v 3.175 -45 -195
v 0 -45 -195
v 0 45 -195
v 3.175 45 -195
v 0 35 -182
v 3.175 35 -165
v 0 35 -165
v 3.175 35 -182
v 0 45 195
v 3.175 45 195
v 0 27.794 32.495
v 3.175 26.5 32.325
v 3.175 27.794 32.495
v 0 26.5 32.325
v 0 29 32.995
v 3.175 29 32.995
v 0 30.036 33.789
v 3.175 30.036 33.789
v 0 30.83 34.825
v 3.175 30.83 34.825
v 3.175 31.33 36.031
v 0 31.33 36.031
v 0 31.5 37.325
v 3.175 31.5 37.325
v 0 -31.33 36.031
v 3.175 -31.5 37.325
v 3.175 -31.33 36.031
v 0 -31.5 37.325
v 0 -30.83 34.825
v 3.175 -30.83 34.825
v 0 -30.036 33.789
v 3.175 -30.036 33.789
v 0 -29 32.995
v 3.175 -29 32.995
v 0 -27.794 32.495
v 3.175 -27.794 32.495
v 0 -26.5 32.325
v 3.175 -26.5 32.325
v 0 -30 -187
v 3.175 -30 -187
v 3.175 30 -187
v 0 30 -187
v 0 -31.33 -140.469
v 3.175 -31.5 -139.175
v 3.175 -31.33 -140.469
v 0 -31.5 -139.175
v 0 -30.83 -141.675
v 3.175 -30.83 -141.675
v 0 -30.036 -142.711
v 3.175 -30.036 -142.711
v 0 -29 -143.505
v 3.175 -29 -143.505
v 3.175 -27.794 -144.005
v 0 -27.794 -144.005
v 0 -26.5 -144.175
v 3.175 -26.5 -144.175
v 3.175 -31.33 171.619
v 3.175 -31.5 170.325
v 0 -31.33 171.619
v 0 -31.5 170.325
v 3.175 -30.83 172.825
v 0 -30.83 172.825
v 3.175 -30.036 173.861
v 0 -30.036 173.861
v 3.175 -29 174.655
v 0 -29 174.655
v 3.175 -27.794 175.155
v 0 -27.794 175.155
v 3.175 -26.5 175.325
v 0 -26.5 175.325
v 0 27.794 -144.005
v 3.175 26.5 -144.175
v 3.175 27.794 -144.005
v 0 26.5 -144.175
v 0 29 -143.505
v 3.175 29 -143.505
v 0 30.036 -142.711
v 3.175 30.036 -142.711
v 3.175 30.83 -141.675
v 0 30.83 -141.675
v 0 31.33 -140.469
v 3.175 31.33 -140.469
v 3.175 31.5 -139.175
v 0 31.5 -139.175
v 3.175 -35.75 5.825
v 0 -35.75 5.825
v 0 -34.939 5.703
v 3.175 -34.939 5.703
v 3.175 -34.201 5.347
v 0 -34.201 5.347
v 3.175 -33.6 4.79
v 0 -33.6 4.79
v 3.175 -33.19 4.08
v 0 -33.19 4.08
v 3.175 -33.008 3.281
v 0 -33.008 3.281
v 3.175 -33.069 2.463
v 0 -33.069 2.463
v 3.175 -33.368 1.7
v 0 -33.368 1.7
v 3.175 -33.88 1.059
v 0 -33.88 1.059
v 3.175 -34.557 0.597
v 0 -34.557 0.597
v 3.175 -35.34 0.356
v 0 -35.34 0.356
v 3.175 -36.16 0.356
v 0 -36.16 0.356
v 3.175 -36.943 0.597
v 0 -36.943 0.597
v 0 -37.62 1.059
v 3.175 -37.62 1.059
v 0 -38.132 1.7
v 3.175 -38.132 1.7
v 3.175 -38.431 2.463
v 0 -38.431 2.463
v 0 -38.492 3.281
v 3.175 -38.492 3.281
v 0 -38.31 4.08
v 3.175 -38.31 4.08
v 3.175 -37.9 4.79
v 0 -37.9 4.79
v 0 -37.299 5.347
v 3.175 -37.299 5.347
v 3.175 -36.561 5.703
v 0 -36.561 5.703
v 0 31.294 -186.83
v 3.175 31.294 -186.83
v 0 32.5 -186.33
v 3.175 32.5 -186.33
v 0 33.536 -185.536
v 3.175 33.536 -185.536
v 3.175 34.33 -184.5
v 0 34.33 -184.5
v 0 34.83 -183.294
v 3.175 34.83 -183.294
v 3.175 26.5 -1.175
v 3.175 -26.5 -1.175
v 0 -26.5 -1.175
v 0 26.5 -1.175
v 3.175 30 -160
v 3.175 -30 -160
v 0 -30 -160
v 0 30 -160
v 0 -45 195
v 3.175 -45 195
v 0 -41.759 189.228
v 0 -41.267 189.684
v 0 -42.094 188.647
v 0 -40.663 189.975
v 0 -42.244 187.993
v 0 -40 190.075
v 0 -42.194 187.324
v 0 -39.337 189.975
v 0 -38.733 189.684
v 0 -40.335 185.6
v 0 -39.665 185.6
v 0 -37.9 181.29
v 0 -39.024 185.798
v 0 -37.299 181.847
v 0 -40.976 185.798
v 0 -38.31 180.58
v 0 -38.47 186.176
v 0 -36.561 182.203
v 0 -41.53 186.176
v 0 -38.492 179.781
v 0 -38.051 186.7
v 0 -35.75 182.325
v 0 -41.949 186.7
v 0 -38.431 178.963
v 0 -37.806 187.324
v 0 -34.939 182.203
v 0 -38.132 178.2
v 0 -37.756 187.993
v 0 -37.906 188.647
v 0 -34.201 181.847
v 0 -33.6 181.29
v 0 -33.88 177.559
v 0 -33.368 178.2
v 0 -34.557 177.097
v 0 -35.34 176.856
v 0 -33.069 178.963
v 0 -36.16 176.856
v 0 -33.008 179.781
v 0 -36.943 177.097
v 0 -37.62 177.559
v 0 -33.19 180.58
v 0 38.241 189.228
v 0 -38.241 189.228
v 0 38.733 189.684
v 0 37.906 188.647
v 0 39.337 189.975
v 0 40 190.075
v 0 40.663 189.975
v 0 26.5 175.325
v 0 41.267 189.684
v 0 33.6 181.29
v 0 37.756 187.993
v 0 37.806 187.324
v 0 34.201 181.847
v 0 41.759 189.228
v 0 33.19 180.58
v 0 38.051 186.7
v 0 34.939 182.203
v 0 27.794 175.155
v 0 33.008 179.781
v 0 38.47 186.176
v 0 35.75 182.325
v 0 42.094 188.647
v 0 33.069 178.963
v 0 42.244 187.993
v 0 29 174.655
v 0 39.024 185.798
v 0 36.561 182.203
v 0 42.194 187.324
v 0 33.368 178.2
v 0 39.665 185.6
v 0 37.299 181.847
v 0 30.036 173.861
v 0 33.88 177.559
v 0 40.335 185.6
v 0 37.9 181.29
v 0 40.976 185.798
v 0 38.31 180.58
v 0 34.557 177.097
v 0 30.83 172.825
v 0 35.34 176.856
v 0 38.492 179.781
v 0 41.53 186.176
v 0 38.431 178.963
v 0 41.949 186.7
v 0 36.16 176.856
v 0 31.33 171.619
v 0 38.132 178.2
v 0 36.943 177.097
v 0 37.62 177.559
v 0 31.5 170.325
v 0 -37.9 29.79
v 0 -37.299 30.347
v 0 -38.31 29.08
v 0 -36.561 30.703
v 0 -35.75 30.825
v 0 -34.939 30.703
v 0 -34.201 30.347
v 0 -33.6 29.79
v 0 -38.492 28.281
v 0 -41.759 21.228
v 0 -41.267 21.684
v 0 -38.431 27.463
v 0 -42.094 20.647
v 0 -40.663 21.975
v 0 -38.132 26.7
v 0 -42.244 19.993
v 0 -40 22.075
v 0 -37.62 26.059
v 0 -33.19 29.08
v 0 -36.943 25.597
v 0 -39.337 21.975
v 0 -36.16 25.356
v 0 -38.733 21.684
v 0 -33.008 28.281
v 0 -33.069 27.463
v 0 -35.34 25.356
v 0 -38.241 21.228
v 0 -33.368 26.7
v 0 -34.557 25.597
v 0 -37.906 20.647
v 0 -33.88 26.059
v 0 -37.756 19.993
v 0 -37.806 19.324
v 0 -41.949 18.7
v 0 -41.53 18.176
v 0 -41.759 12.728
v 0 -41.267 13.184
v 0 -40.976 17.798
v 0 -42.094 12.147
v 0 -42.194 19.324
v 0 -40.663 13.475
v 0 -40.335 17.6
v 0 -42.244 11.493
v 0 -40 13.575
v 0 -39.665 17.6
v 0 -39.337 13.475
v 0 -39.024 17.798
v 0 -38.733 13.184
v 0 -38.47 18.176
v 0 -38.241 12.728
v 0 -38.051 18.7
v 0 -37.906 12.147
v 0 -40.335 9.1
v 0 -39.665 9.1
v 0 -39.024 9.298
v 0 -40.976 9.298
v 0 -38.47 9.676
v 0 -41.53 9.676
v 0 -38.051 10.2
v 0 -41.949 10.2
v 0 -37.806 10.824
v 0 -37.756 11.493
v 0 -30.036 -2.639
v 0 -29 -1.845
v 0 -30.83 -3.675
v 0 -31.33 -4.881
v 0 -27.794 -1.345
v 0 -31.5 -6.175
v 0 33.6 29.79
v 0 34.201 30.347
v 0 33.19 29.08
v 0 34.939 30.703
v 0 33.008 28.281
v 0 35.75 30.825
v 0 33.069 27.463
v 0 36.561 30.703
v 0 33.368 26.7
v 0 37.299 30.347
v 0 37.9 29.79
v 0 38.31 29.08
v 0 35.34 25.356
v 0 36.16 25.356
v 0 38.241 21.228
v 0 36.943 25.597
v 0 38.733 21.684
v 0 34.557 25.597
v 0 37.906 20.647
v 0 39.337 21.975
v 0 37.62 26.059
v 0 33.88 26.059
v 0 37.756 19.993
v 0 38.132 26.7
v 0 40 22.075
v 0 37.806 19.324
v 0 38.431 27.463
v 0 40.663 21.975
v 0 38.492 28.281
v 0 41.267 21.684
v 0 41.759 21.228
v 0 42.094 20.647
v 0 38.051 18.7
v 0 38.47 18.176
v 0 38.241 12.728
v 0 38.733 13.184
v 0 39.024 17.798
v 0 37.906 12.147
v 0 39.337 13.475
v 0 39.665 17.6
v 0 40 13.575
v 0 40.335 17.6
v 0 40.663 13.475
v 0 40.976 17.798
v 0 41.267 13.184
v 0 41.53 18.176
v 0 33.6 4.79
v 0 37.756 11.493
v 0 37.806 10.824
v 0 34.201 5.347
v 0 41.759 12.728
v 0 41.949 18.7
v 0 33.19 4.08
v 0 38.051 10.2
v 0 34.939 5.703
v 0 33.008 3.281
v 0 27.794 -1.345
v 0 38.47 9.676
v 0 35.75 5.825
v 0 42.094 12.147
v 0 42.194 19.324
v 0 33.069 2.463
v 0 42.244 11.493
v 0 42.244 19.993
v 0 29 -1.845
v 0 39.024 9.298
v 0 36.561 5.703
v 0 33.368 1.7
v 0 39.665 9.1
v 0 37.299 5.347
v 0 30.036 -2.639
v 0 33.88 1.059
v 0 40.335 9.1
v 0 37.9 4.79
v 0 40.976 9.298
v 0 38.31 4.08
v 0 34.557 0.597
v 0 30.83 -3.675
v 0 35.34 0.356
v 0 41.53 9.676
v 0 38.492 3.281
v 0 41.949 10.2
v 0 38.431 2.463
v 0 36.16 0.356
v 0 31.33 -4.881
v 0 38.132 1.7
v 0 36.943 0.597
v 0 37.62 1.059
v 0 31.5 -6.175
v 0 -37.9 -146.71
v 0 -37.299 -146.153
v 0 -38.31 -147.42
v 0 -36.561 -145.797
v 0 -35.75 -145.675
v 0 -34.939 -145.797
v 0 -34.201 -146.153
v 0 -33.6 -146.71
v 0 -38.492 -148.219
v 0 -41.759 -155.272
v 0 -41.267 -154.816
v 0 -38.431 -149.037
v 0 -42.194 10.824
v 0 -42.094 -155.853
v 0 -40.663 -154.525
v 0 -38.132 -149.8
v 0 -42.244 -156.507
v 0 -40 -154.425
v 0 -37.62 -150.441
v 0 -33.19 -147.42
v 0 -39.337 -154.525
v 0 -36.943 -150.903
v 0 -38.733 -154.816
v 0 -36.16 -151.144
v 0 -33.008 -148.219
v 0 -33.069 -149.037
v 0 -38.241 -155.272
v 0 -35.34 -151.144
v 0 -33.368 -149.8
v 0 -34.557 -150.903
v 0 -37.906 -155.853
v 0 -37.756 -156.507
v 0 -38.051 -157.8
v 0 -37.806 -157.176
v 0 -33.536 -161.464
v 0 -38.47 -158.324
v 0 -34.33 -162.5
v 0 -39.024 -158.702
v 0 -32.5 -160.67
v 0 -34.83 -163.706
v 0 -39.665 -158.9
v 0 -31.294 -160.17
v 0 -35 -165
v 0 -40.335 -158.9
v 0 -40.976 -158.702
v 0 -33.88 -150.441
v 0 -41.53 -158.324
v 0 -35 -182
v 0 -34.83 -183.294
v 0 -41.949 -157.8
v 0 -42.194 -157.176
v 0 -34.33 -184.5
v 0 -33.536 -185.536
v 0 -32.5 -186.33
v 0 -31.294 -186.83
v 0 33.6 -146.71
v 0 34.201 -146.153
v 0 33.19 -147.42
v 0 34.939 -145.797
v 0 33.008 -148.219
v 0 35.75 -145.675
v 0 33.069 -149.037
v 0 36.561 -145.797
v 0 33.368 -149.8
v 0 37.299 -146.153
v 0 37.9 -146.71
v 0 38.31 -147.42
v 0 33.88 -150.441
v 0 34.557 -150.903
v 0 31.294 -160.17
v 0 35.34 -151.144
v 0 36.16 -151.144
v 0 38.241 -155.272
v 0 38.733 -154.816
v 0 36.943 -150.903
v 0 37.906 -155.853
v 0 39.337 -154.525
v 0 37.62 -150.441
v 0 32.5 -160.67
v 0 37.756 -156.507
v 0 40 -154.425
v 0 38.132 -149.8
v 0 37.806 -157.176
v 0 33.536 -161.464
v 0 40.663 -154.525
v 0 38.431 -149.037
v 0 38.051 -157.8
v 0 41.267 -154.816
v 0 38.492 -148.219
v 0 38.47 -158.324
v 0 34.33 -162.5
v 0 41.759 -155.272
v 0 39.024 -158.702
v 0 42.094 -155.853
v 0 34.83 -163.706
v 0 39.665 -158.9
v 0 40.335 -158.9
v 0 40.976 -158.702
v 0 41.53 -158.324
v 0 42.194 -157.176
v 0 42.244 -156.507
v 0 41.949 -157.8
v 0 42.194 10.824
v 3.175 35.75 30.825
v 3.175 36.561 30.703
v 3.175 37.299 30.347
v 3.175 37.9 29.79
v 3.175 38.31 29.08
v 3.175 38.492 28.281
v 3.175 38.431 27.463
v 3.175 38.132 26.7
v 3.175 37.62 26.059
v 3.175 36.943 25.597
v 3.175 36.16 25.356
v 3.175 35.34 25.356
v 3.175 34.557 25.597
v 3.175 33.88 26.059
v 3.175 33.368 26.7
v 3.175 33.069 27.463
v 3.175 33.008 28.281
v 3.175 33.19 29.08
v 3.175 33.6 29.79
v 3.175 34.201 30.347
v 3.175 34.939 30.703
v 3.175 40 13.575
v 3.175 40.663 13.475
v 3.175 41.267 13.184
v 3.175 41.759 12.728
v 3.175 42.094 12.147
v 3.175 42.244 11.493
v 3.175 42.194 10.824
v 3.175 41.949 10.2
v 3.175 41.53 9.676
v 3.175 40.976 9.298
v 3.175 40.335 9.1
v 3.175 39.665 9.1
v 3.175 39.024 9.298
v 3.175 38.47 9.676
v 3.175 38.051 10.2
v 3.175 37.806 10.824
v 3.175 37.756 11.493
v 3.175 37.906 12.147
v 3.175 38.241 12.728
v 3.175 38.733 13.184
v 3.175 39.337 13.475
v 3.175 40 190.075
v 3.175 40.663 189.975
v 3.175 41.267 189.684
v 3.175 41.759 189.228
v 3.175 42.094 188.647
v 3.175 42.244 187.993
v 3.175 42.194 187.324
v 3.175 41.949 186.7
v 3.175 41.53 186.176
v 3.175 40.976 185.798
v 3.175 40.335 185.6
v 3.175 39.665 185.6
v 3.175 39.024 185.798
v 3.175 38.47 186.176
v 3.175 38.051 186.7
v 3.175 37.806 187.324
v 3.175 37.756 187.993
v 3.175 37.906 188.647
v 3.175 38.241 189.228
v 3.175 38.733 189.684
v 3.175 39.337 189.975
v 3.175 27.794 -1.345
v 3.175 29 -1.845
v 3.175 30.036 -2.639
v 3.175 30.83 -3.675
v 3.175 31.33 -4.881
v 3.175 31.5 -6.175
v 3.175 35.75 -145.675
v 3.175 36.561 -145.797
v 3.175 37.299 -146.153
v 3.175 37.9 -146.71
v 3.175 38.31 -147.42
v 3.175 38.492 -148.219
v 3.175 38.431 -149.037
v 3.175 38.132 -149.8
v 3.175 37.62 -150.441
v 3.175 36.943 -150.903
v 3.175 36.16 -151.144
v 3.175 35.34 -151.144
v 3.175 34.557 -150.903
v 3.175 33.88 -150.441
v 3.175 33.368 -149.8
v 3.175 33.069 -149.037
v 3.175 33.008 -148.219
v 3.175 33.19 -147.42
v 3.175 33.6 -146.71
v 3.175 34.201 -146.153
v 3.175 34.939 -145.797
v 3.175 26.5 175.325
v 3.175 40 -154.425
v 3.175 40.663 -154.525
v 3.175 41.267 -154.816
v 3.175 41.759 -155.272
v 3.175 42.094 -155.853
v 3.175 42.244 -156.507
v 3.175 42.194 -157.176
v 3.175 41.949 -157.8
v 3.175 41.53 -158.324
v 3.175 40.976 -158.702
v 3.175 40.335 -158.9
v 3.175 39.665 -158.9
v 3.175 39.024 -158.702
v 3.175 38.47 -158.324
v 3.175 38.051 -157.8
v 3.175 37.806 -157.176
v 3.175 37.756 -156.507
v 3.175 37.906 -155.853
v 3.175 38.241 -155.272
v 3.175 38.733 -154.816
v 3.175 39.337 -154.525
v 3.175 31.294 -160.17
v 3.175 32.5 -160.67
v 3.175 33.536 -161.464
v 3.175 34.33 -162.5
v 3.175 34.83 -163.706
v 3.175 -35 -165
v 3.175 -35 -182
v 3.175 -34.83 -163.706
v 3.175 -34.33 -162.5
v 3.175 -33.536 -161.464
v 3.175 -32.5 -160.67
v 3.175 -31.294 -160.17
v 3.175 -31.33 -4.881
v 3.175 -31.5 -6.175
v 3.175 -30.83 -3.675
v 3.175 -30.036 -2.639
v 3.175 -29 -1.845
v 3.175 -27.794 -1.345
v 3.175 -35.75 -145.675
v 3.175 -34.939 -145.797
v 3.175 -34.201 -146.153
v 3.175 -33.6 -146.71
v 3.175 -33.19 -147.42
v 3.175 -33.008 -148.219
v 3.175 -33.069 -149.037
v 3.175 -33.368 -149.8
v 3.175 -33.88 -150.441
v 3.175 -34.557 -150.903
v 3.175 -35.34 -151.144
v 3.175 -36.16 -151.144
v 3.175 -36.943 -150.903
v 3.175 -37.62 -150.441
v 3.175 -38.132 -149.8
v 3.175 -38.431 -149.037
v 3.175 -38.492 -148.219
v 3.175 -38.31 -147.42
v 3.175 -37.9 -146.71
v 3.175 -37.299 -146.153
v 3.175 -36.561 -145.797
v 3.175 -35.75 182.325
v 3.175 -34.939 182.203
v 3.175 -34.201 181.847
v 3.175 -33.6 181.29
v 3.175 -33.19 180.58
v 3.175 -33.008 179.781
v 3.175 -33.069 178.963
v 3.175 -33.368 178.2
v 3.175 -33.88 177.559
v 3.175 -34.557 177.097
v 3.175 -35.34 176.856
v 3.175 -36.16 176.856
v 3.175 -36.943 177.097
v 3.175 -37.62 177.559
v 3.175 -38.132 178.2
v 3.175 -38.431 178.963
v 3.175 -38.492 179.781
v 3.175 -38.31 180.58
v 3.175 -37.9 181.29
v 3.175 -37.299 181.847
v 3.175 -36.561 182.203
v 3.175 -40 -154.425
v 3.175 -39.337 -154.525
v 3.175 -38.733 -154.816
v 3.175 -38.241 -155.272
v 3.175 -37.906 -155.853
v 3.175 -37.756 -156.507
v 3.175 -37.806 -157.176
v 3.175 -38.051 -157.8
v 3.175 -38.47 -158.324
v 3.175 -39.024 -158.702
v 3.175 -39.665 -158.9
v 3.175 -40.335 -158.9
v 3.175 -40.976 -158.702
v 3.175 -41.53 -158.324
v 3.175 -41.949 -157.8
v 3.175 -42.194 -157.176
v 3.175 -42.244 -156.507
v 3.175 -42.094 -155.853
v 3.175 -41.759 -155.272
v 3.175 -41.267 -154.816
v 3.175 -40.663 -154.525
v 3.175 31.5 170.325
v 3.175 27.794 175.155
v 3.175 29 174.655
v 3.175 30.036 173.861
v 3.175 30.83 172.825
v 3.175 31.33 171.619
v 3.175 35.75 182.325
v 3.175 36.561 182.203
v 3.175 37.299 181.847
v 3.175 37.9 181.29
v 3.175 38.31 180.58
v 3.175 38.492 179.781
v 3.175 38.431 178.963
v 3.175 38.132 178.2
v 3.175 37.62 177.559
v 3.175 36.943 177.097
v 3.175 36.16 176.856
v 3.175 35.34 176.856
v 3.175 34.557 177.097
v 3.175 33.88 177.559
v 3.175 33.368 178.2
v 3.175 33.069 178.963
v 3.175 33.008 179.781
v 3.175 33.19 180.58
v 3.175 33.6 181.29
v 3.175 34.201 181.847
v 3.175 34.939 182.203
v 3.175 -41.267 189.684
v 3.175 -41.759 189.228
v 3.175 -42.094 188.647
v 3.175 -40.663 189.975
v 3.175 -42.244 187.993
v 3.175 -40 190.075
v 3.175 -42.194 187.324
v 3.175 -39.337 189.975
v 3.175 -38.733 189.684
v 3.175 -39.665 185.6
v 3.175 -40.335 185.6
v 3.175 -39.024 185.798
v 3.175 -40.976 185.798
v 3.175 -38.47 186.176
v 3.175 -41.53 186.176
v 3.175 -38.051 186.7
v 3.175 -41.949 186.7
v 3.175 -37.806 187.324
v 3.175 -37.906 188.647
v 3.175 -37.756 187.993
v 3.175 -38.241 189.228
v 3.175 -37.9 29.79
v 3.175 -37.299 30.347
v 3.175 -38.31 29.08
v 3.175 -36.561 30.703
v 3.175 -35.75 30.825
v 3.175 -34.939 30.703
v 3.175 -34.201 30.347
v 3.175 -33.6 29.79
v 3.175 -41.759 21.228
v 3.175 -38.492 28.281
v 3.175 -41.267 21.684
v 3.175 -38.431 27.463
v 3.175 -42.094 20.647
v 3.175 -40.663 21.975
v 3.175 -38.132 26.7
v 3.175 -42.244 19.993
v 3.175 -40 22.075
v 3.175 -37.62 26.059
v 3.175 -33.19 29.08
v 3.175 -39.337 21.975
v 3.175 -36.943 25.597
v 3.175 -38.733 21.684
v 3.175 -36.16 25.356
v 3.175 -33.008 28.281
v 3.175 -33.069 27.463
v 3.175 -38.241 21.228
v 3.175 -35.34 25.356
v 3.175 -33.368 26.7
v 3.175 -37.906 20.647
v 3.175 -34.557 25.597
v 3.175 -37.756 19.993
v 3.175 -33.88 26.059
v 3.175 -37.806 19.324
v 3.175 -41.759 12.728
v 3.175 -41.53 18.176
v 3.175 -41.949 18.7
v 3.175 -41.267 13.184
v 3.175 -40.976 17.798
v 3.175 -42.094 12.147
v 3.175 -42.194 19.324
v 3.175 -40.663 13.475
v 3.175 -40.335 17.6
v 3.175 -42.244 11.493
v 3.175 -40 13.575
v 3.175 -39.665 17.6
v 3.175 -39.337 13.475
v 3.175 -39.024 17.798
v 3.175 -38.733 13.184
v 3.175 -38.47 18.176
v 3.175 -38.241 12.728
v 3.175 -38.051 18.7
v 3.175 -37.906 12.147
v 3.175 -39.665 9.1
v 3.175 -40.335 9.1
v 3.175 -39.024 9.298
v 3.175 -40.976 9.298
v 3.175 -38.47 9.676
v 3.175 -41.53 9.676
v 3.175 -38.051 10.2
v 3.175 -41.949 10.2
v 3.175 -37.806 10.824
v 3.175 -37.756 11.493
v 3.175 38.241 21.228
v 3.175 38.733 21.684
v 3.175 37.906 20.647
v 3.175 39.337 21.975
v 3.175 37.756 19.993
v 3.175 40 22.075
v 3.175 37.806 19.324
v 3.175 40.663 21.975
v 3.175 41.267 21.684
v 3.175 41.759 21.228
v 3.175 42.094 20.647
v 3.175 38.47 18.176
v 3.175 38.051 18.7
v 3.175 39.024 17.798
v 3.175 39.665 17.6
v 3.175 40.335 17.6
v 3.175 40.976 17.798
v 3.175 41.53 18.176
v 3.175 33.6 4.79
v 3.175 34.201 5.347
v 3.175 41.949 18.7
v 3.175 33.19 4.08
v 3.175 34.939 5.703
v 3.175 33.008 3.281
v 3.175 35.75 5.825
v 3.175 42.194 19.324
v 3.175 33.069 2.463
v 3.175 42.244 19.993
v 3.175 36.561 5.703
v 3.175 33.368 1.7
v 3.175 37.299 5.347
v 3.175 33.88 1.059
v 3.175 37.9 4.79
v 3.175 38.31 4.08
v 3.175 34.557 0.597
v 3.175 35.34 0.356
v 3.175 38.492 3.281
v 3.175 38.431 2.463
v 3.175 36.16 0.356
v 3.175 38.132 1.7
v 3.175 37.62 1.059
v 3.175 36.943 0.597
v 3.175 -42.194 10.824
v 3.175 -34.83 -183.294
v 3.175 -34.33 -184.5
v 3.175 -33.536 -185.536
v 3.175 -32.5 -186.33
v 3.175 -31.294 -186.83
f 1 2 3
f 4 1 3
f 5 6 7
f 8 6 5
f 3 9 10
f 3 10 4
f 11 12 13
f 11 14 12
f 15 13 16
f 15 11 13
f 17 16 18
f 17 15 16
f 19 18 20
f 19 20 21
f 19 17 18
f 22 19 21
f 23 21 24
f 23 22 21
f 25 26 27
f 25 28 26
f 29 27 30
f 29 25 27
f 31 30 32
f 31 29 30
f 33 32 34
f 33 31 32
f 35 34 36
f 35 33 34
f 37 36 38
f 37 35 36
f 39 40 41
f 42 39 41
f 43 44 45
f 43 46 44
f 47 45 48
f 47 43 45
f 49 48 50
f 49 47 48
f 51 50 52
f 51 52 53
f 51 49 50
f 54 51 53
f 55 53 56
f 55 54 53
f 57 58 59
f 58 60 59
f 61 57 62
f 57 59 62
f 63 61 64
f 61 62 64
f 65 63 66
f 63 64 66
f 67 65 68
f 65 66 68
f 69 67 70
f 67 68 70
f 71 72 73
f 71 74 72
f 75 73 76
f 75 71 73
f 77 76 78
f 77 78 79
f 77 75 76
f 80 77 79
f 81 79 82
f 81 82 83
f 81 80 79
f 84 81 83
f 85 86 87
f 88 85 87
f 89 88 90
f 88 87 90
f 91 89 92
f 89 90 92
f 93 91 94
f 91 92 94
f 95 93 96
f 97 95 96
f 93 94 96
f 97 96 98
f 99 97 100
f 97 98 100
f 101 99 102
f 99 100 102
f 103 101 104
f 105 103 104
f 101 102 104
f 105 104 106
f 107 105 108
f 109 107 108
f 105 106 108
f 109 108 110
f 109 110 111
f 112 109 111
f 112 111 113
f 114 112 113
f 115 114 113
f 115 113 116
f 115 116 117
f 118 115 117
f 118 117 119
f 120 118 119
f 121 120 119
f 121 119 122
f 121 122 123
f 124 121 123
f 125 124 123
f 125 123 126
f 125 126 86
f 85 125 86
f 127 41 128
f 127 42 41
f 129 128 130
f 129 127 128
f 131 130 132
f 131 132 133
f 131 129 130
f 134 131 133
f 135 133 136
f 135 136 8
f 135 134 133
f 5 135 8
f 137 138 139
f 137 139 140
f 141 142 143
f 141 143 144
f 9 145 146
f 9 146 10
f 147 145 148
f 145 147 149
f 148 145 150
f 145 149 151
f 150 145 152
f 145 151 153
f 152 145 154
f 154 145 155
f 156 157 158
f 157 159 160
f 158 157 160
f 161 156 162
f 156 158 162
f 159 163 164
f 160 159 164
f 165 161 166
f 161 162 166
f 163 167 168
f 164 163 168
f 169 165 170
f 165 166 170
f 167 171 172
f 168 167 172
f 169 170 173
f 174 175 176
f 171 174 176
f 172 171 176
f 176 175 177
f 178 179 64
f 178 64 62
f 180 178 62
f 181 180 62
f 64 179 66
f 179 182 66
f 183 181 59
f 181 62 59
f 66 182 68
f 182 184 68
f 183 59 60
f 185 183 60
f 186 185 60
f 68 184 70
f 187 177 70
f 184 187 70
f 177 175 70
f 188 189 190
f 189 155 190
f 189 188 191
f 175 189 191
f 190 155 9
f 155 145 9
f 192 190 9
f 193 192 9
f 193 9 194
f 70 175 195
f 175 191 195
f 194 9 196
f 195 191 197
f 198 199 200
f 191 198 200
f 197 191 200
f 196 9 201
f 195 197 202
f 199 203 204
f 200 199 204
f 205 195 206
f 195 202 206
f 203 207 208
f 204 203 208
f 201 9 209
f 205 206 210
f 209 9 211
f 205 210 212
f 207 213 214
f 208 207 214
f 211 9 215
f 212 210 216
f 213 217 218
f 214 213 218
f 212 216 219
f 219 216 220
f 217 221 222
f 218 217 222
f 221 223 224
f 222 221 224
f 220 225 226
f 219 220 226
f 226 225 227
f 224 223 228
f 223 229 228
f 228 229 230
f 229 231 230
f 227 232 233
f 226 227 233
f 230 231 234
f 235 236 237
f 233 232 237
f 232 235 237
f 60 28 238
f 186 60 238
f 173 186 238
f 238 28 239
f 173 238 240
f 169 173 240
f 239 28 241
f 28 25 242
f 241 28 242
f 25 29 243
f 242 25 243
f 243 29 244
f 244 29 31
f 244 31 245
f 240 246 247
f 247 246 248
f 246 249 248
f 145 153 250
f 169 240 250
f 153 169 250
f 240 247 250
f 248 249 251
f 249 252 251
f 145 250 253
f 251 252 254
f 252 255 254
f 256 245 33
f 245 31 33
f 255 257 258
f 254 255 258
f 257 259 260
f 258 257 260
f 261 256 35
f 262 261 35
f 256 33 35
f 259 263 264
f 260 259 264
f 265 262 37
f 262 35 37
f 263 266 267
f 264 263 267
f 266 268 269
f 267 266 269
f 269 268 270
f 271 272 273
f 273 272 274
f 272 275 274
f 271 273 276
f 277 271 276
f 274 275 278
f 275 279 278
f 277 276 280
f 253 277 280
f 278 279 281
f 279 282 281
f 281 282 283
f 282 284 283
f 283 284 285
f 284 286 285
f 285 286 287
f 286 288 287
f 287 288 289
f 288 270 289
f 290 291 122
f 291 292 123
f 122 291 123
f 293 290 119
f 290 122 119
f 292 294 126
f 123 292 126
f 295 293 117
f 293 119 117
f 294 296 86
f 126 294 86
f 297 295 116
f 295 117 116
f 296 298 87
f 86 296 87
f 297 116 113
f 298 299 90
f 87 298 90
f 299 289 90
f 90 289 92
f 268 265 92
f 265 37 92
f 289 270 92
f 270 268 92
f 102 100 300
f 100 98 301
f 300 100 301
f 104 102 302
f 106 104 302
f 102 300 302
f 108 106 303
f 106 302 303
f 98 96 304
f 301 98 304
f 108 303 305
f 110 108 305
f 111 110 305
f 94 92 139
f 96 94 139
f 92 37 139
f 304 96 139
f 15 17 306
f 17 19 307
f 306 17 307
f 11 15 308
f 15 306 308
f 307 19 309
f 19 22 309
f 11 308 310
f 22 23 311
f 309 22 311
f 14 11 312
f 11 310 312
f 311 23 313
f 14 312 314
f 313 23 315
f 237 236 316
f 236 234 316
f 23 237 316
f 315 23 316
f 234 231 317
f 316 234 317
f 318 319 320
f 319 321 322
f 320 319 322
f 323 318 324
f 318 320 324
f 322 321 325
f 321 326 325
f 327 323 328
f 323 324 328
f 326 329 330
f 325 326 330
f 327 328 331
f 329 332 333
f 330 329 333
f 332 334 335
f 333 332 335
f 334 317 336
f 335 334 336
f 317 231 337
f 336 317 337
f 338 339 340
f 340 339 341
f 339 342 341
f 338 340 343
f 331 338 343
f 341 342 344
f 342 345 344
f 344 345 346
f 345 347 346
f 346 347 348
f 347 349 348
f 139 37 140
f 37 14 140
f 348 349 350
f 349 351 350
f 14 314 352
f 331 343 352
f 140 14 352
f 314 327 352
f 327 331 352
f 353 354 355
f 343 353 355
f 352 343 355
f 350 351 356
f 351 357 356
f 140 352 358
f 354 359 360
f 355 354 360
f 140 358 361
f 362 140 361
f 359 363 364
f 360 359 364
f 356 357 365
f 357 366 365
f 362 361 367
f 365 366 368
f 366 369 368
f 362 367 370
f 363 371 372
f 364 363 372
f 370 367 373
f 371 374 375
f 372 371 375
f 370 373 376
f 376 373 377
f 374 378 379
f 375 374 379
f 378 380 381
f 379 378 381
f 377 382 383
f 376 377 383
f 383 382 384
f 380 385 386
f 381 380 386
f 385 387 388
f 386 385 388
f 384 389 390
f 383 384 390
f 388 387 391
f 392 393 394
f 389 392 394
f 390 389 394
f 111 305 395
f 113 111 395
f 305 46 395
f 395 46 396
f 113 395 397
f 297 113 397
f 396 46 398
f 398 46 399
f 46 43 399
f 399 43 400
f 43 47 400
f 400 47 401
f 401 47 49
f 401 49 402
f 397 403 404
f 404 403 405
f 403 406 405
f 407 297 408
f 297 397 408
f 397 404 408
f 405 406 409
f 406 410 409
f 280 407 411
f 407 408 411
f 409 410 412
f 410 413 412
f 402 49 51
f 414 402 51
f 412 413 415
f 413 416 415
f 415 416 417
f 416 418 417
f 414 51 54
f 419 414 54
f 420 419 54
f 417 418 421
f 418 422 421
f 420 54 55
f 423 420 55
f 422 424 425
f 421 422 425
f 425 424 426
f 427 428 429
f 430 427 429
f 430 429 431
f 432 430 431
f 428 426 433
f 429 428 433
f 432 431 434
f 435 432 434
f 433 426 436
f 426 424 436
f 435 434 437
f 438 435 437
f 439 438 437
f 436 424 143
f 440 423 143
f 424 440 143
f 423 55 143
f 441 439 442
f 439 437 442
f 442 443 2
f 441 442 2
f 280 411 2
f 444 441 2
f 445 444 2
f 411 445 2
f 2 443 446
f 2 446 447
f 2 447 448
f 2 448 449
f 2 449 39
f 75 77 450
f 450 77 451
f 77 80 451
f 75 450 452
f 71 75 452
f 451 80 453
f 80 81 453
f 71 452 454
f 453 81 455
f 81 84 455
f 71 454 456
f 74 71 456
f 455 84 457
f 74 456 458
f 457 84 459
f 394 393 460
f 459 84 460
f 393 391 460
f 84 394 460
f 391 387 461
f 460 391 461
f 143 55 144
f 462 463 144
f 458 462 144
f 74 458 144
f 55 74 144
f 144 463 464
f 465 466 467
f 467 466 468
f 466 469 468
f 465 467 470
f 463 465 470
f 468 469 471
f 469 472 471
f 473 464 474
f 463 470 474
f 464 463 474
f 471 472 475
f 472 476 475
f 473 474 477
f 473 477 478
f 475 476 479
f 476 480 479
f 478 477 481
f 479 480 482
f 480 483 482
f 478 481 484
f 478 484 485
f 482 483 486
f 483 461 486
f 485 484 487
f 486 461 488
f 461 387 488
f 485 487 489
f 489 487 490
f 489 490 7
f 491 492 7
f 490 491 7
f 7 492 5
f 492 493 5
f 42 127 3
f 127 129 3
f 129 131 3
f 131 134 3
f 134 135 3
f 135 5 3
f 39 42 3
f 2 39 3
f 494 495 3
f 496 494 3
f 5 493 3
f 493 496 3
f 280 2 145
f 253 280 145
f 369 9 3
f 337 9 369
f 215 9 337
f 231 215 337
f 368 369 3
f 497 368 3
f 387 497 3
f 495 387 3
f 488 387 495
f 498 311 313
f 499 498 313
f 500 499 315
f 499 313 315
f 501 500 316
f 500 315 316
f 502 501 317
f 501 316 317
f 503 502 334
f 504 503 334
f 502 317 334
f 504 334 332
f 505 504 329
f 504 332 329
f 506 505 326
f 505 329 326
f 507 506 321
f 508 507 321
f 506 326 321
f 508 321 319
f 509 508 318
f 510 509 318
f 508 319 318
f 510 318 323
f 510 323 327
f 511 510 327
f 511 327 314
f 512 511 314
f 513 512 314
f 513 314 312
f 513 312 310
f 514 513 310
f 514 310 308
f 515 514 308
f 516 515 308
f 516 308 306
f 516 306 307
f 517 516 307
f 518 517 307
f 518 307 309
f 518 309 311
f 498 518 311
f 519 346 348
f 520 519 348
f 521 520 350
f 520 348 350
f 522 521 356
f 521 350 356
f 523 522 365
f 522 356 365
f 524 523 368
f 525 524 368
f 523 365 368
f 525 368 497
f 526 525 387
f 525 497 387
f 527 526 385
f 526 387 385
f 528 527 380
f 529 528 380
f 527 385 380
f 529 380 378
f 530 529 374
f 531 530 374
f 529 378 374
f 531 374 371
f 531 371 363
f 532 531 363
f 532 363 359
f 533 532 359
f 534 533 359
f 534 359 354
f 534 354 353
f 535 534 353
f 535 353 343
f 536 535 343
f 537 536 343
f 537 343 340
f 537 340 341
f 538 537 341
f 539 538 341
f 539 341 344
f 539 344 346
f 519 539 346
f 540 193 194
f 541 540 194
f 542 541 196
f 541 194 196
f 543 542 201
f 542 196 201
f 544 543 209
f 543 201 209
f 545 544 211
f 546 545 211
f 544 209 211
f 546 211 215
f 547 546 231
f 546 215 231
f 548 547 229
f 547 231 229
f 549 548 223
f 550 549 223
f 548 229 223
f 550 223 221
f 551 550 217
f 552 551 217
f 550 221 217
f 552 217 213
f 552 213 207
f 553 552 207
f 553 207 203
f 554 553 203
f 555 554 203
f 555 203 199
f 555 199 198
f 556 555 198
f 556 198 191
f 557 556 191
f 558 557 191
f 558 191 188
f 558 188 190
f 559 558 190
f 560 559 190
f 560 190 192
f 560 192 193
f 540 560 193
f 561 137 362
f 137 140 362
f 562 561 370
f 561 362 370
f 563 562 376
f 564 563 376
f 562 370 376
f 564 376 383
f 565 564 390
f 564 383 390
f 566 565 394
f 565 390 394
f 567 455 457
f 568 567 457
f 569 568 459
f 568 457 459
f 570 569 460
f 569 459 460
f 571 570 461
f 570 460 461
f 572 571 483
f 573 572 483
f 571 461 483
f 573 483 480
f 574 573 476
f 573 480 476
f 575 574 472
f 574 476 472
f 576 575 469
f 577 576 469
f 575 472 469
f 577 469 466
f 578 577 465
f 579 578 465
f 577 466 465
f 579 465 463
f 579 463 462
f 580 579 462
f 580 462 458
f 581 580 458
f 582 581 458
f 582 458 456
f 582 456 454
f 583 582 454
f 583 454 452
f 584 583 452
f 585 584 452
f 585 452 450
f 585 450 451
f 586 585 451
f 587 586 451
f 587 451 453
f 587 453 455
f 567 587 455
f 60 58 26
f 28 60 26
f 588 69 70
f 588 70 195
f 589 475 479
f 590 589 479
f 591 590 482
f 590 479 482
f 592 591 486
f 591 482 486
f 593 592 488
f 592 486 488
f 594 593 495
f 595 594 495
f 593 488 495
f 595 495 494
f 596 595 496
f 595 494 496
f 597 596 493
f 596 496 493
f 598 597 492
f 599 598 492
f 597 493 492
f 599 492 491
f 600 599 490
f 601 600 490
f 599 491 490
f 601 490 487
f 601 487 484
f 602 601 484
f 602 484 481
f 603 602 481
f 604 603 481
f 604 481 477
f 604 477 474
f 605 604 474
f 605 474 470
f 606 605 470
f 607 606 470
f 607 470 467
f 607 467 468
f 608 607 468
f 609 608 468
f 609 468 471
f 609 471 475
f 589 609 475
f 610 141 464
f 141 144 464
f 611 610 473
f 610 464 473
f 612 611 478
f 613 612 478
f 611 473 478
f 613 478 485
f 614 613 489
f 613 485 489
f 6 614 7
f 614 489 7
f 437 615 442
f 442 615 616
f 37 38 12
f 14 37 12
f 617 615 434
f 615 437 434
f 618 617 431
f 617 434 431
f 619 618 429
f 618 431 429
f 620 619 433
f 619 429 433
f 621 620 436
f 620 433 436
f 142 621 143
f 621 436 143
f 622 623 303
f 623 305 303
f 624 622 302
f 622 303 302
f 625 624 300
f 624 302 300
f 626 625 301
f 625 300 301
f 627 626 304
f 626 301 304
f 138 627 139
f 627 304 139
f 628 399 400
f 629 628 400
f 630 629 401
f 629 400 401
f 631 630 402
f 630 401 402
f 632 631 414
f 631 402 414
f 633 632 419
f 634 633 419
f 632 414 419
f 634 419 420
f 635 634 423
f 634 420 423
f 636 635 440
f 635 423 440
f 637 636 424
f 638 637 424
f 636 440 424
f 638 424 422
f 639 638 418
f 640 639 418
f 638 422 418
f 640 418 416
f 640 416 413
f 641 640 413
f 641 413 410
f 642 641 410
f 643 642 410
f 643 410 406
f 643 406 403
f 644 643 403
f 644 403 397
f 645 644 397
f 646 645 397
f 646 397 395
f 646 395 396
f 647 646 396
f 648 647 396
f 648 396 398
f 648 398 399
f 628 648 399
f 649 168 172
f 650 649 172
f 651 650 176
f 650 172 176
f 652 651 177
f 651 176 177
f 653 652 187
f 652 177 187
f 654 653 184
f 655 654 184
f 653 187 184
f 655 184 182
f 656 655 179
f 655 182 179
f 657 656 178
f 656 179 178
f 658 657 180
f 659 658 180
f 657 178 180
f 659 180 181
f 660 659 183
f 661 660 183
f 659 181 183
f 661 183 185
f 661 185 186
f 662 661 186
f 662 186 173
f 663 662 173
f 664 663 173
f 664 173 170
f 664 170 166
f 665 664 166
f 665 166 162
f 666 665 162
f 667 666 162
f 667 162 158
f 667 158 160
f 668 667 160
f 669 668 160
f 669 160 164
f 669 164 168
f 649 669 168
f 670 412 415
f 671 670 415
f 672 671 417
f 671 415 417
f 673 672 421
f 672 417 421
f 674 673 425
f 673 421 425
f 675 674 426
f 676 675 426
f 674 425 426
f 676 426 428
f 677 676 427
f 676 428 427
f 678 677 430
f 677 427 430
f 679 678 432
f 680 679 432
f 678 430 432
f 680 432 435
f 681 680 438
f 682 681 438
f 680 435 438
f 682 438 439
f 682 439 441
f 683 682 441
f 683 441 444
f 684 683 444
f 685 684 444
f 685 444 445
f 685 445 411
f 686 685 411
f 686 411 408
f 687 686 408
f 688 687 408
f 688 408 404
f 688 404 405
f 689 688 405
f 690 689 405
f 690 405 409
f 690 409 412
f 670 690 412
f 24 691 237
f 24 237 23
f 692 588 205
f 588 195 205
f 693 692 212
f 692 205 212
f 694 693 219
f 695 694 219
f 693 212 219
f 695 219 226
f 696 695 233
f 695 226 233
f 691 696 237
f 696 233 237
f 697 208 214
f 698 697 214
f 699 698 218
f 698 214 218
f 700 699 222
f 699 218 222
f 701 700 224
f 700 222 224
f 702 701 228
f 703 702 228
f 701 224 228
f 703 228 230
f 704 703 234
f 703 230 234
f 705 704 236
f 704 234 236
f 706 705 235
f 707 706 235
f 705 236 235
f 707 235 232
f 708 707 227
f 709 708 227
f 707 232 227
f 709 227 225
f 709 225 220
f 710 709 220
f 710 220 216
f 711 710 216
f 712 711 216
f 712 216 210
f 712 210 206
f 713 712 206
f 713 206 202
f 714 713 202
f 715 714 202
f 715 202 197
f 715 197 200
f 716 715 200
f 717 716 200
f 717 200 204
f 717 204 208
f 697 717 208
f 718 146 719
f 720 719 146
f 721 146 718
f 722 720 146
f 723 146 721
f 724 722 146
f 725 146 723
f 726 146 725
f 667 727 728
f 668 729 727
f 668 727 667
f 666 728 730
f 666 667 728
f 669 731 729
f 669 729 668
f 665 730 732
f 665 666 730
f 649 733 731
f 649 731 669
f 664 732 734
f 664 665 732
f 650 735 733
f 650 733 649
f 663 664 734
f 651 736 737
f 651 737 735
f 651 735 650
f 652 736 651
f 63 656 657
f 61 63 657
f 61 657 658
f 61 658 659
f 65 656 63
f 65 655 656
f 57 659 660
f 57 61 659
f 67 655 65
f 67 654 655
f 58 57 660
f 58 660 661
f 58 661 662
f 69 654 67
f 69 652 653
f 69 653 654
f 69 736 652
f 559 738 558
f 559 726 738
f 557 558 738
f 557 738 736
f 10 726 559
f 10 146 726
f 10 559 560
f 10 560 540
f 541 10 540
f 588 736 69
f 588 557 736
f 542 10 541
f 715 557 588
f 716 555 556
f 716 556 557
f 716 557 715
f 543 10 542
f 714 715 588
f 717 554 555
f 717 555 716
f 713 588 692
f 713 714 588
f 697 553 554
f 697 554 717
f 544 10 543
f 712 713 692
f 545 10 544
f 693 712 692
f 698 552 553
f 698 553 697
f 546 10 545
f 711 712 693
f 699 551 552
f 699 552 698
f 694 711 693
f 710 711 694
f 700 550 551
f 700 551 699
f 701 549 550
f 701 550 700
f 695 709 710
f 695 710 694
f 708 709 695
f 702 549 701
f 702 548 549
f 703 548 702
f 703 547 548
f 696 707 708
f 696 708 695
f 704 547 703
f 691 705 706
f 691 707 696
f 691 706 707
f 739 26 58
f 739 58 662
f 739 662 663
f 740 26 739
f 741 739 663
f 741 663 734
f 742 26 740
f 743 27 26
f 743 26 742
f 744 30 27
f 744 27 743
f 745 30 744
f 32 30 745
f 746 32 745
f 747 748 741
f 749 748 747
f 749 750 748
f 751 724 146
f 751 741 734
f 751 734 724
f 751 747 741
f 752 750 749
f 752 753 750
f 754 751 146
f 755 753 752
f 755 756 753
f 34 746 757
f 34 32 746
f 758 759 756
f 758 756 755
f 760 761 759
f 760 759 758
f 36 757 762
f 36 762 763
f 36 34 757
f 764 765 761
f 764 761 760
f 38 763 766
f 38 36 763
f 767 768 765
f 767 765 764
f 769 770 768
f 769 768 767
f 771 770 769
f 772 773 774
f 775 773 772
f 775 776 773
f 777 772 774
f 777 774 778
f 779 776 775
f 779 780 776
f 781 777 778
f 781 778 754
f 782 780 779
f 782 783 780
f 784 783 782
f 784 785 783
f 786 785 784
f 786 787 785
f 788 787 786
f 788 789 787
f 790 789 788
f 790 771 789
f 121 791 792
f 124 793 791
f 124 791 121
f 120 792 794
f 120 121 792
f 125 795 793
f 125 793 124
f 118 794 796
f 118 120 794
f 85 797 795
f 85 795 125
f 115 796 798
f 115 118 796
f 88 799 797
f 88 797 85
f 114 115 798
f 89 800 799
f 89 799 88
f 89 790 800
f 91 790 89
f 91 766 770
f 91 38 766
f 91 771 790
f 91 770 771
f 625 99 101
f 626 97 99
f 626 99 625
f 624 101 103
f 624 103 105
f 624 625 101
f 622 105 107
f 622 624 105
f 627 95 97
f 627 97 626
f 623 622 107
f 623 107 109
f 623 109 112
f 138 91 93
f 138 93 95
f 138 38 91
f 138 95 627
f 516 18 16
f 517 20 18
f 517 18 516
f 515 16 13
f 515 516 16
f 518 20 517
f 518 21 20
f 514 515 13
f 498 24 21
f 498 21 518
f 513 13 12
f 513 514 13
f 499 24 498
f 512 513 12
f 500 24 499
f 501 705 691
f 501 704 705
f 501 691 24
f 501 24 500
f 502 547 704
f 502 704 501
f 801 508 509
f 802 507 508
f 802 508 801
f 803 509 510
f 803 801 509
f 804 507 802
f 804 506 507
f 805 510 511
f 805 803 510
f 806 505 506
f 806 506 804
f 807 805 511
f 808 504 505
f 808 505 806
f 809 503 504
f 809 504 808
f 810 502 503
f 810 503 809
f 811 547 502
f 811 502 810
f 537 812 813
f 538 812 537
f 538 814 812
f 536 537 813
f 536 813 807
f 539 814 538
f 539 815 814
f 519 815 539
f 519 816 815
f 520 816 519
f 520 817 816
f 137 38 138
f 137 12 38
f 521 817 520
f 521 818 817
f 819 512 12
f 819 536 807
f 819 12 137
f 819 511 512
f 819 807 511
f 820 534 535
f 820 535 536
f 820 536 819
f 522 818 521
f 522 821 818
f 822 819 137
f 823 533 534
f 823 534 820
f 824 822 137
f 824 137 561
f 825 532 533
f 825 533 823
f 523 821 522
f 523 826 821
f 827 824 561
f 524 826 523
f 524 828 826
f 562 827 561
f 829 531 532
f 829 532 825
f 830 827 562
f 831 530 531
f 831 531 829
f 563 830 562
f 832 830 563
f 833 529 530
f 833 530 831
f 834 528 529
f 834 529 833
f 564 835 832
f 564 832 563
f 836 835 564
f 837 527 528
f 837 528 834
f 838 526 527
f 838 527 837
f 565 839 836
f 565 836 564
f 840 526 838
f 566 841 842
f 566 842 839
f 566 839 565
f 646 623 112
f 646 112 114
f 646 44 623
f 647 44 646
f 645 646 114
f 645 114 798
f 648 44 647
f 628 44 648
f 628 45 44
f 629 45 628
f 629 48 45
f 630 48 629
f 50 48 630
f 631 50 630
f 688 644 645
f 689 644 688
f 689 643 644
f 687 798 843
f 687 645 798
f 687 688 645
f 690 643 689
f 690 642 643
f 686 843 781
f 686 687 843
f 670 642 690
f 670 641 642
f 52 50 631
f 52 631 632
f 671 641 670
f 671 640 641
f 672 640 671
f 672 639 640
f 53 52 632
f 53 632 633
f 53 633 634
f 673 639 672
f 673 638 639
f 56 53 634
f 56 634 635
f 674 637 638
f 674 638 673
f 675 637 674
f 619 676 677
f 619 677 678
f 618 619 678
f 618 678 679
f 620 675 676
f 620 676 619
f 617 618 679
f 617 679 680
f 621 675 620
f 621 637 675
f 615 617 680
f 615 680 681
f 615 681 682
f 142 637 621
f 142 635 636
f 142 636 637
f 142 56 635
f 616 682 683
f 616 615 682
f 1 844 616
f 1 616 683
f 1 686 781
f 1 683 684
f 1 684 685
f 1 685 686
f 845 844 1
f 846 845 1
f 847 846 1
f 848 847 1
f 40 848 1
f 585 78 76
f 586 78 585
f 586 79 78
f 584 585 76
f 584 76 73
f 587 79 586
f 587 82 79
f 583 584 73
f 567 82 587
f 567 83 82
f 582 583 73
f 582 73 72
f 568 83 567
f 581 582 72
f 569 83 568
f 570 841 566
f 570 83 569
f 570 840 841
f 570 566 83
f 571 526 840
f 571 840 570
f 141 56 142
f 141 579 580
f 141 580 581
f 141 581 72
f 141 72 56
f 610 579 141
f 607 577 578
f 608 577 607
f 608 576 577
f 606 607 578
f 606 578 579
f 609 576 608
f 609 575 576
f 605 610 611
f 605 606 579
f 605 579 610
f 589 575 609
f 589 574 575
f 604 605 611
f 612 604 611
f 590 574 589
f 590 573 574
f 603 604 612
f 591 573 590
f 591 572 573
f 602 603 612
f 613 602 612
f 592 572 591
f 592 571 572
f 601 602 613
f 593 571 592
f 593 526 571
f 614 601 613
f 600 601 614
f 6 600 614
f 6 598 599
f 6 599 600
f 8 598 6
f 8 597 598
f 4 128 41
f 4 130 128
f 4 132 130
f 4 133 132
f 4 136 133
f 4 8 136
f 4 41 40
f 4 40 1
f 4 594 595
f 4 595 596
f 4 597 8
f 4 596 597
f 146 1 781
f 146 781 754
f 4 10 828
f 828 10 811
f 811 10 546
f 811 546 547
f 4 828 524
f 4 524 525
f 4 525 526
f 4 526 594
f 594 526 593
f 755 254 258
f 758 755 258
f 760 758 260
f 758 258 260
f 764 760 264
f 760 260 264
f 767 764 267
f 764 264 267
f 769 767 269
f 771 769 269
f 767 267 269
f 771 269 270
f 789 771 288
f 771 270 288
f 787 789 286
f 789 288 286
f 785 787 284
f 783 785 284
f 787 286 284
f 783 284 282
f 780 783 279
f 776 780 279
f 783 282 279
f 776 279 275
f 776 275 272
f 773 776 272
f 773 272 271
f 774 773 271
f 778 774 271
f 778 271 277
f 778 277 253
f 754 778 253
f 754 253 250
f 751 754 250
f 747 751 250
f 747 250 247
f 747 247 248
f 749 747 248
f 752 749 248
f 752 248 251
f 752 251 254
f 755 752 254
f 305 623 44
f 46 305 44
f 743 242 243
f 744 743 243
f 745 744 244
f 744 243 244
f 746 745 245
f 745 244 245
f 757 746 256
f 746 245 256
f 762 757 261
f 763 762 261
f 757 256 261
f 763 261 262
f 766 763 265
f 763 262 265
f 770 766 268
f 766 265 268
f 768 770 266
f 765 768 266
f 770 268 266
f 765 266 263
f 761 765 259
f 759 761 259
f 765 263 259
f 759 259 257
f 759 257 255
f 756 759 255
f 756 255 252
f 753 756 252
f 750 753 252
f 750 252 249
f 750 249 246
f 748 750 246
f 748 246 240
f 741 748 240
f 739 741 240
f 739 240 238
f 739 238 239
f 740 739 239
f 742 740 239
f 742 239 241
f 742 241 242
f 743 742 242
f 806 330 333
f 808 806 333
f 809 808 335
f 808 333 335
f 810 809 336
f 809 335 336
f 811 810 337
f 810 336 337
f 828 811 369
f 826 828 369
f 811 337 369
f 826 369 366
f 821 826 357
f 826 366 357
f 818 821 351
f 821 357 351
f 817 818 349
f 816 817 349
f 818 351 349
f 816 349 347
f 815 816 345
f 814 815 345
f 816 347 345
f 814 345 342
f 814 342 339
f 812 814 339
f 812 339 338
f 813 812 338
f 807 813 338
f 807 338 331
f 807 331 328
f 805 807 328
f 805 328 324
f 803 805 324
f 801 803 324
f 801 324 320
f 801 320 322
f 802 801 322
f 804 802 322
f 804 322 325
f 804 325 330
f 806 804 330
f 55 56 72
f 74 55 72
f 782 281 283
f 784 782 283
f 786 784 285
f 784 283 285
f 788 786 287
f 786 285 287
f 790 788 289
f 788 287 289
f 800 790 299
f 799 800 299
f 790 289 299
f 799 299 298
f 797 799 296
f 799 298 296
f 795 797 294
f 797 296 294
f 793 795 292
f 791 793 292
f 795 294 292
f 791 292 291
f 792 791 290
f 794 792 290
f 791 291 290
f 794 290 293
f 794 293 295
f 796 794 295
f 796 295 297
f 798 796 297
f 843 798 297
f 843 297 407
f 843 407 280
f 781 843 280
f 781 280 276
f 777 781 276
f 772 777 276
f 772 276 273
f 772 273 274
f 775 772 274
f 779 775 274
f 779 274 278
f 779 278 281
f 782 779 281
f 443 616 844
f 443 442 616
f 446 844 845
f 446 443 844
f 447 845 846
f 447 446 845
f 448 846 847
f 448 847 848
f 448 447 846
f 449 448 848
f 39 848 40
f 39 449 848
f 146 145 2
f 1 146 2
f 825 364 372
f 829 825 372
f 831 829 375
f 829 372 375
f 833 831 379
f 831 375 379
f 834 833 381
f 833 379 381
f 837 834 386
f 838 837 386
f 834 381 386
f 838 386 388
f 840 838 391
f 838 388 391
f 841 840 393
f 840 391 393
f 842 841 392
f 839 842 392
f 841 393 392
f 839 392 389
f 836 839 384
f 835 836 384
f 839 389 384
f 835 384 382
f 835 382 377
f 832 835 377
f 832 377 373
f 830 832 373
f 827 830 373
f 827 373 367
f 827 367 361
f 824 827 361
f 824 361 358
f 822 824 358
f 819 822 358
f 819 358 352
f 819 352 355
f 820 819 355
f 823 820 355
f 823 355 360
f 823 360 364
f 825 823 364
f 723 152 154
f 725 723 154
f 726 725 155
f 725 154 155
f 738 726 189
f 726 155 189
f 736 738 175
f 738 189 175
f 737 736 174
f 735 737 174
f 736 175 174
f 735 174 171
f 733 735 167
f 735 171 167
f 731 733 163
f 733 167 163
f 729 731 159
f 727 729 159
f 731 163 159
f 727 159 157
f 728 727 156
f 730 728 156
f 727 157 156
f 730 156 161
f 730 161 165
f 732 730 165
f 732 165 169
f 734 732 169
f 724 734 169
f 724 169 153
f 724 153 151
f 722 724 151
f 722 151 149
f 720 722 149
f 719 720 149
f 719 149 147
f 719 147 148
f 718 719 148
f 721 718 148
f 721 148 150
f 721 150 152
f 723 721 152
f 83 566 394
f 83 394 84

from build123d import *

# Parameters (mm, degrees)
SKETCH1_W            = 390
SKETCH1_H            = 90
BOSS_EXTRUDE1_DEPTH  = 3.175
SKETCH2_W            = 143
SKETCH2_H            = 63
CUT_EXTRUDE1_DEPTH   = 3.175
M5_CLEARANCE_HOLE1_D = 5.5
SKETCH6_W            = 27
SKETCH6_H            = 70
CUT_EXTRUDE2_DEPTH   = 3.175
M4_CLEARANCE_HOLE2_D = 4.5
FILLET1_R            = 5


with BuildPart() as part:
    # Sketch1 → Boss-Extrude1 (new body)
    with BuildSketch(Plane(origin=(0, 0, 0), x_dir=(0, 0, -1), z_dir=(1, 0, 0))):
        Rectangle(SKETCH1_W, SKETCH1_H)
    extrude(amount=BOSS_EXTRUDE1_DEPTH)

    # Sketch2 → Cut-Extrude1 (cut)
    with BuildSketch(Plane(origin=(3.175, 0, 0), x_dir=(0, 0, -1), z_dir=(1, 0, 0))):
        with Locations((72.675, 0)):
            Rectangle(SKETCH2_W, SKETCH2_H)
        with Locations((-103.825, 0)):
            Rectangle(SKETCH2_W, SKETCH2_H)
    extrude(amount=-CUT_EXTRUDE1_DEPTH, mode=Mode.SUBTRACT)

    # M5 Clearance Hole1 (through all)
    with Locations(Plane(origin=(3.175, 0, 0), x_dir=(0, 0, -1), z_dir=(1, 0, 0))):
        with Locations((-103.825, 0), (-28.075, 35.75), (-179.575, -35.75), (-179.575, 35.75), (-28.075, -35.75), (72.675, 0), (148.425, 35.75), (-3.075, -35.75), (-3.075, 35.75), (148.425, -35.75)):
            Hole(M5_CLEARANCE_HOLE1_D / 2)

    # Sketch6 → Cut-Extrude2 (cut)
    with BuildSketch(Plane(origin=(3.175, 0, 0), x_dir=(0, 0, -1), z_dir=(1, 0, 0))):
        with Locations((173.5, 0)):
            Rectangle(SKETCH6_W, SKETCH6_H)
    extrude(amount=-CUT_EXTRUDE2_DEPTH, mode=Mode.SUBTRACT)

    # M4 Clearance Hole2 (through all)
    with Locations(Plane(origin=(3.175, 0, 0), x_dir=(0, 0, -1), z_dir=(1, 0, 0))):
        with Locations((-103.825, 0), (-19.825, 40), (-187.825, -40), (-187.825, 40), (-19.825, -40), (72.675, 0), (156.675, 40), (-11.325, -40), (-11.325, 40), (156.675, -40)):
            Hole(M4_CLEARANCE_HOLE2_D / 2)

    # Fillet1
    fillet1_edges = [part.edges().sort_by_distance(p)[0] for p in [
        (1.5875, 35, -187),
        (1.5875, -35, -187),
        (1.5875, -35, -160),
        (1.5875, 35, -160),
        (1.5875, 31.5, 32.325),
        (1.5875, -31.5, 32.325),
        (1.5875, -31.5, 175.325),
        (1.5875, 31.5, 175.325),
        (1.5875, 31.5, -144.175),
        (1.5875, -31.5, -144.175),
        (1.5875, -31.5, -1.175),
        (1.5875, 31.5, -1.175),
    ]]
    fillet(fillet1_edges, radius=FILLET1_R)


solid = part.part
